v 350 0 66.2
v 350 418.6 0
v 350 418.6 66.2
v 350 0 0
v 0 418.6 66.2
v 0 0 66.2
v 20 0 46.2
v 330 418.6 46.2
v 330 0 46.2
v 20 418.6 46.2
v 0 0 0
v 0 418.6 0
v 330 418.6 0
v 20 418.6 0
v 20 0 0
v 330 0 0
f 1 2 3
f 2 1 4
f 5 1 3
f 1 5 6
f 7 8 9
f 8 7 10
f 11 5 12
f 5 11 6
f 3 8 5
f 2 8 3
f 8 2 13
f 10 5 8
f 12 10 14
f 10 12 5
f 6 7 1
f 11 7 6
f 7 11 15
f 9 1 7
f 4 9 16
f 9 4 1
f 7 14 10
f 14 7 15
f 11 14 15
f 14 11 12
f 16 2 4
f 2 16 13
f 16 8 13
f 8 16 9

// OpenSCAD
$laptopdepth=398.6;
$laptopheight=26.2;
$laptopwidth=290.0;
$clearance=20;

$tabledepth=$clearance+$laptopdepth;
$tablewidth=$clearance+$laptopwidth;
$tableheight=$clearance+$laptopheight;
$tablethickness=20;

//table body
translate([0,0,$tableheight])
    cube([
    $tablewidth+2*$tablethickness,
    $tabledepth,
    $tablethickness]);

//legs
translate([0,0,0])
    cube([
    $tablethickness,
    $tabledepth,
    $tableheight]);
    
translate([$tablewidth+$tablethickness,0,0])
    cube([
    $tablethickness,
    $tabledepth,
    $tableheight]);
